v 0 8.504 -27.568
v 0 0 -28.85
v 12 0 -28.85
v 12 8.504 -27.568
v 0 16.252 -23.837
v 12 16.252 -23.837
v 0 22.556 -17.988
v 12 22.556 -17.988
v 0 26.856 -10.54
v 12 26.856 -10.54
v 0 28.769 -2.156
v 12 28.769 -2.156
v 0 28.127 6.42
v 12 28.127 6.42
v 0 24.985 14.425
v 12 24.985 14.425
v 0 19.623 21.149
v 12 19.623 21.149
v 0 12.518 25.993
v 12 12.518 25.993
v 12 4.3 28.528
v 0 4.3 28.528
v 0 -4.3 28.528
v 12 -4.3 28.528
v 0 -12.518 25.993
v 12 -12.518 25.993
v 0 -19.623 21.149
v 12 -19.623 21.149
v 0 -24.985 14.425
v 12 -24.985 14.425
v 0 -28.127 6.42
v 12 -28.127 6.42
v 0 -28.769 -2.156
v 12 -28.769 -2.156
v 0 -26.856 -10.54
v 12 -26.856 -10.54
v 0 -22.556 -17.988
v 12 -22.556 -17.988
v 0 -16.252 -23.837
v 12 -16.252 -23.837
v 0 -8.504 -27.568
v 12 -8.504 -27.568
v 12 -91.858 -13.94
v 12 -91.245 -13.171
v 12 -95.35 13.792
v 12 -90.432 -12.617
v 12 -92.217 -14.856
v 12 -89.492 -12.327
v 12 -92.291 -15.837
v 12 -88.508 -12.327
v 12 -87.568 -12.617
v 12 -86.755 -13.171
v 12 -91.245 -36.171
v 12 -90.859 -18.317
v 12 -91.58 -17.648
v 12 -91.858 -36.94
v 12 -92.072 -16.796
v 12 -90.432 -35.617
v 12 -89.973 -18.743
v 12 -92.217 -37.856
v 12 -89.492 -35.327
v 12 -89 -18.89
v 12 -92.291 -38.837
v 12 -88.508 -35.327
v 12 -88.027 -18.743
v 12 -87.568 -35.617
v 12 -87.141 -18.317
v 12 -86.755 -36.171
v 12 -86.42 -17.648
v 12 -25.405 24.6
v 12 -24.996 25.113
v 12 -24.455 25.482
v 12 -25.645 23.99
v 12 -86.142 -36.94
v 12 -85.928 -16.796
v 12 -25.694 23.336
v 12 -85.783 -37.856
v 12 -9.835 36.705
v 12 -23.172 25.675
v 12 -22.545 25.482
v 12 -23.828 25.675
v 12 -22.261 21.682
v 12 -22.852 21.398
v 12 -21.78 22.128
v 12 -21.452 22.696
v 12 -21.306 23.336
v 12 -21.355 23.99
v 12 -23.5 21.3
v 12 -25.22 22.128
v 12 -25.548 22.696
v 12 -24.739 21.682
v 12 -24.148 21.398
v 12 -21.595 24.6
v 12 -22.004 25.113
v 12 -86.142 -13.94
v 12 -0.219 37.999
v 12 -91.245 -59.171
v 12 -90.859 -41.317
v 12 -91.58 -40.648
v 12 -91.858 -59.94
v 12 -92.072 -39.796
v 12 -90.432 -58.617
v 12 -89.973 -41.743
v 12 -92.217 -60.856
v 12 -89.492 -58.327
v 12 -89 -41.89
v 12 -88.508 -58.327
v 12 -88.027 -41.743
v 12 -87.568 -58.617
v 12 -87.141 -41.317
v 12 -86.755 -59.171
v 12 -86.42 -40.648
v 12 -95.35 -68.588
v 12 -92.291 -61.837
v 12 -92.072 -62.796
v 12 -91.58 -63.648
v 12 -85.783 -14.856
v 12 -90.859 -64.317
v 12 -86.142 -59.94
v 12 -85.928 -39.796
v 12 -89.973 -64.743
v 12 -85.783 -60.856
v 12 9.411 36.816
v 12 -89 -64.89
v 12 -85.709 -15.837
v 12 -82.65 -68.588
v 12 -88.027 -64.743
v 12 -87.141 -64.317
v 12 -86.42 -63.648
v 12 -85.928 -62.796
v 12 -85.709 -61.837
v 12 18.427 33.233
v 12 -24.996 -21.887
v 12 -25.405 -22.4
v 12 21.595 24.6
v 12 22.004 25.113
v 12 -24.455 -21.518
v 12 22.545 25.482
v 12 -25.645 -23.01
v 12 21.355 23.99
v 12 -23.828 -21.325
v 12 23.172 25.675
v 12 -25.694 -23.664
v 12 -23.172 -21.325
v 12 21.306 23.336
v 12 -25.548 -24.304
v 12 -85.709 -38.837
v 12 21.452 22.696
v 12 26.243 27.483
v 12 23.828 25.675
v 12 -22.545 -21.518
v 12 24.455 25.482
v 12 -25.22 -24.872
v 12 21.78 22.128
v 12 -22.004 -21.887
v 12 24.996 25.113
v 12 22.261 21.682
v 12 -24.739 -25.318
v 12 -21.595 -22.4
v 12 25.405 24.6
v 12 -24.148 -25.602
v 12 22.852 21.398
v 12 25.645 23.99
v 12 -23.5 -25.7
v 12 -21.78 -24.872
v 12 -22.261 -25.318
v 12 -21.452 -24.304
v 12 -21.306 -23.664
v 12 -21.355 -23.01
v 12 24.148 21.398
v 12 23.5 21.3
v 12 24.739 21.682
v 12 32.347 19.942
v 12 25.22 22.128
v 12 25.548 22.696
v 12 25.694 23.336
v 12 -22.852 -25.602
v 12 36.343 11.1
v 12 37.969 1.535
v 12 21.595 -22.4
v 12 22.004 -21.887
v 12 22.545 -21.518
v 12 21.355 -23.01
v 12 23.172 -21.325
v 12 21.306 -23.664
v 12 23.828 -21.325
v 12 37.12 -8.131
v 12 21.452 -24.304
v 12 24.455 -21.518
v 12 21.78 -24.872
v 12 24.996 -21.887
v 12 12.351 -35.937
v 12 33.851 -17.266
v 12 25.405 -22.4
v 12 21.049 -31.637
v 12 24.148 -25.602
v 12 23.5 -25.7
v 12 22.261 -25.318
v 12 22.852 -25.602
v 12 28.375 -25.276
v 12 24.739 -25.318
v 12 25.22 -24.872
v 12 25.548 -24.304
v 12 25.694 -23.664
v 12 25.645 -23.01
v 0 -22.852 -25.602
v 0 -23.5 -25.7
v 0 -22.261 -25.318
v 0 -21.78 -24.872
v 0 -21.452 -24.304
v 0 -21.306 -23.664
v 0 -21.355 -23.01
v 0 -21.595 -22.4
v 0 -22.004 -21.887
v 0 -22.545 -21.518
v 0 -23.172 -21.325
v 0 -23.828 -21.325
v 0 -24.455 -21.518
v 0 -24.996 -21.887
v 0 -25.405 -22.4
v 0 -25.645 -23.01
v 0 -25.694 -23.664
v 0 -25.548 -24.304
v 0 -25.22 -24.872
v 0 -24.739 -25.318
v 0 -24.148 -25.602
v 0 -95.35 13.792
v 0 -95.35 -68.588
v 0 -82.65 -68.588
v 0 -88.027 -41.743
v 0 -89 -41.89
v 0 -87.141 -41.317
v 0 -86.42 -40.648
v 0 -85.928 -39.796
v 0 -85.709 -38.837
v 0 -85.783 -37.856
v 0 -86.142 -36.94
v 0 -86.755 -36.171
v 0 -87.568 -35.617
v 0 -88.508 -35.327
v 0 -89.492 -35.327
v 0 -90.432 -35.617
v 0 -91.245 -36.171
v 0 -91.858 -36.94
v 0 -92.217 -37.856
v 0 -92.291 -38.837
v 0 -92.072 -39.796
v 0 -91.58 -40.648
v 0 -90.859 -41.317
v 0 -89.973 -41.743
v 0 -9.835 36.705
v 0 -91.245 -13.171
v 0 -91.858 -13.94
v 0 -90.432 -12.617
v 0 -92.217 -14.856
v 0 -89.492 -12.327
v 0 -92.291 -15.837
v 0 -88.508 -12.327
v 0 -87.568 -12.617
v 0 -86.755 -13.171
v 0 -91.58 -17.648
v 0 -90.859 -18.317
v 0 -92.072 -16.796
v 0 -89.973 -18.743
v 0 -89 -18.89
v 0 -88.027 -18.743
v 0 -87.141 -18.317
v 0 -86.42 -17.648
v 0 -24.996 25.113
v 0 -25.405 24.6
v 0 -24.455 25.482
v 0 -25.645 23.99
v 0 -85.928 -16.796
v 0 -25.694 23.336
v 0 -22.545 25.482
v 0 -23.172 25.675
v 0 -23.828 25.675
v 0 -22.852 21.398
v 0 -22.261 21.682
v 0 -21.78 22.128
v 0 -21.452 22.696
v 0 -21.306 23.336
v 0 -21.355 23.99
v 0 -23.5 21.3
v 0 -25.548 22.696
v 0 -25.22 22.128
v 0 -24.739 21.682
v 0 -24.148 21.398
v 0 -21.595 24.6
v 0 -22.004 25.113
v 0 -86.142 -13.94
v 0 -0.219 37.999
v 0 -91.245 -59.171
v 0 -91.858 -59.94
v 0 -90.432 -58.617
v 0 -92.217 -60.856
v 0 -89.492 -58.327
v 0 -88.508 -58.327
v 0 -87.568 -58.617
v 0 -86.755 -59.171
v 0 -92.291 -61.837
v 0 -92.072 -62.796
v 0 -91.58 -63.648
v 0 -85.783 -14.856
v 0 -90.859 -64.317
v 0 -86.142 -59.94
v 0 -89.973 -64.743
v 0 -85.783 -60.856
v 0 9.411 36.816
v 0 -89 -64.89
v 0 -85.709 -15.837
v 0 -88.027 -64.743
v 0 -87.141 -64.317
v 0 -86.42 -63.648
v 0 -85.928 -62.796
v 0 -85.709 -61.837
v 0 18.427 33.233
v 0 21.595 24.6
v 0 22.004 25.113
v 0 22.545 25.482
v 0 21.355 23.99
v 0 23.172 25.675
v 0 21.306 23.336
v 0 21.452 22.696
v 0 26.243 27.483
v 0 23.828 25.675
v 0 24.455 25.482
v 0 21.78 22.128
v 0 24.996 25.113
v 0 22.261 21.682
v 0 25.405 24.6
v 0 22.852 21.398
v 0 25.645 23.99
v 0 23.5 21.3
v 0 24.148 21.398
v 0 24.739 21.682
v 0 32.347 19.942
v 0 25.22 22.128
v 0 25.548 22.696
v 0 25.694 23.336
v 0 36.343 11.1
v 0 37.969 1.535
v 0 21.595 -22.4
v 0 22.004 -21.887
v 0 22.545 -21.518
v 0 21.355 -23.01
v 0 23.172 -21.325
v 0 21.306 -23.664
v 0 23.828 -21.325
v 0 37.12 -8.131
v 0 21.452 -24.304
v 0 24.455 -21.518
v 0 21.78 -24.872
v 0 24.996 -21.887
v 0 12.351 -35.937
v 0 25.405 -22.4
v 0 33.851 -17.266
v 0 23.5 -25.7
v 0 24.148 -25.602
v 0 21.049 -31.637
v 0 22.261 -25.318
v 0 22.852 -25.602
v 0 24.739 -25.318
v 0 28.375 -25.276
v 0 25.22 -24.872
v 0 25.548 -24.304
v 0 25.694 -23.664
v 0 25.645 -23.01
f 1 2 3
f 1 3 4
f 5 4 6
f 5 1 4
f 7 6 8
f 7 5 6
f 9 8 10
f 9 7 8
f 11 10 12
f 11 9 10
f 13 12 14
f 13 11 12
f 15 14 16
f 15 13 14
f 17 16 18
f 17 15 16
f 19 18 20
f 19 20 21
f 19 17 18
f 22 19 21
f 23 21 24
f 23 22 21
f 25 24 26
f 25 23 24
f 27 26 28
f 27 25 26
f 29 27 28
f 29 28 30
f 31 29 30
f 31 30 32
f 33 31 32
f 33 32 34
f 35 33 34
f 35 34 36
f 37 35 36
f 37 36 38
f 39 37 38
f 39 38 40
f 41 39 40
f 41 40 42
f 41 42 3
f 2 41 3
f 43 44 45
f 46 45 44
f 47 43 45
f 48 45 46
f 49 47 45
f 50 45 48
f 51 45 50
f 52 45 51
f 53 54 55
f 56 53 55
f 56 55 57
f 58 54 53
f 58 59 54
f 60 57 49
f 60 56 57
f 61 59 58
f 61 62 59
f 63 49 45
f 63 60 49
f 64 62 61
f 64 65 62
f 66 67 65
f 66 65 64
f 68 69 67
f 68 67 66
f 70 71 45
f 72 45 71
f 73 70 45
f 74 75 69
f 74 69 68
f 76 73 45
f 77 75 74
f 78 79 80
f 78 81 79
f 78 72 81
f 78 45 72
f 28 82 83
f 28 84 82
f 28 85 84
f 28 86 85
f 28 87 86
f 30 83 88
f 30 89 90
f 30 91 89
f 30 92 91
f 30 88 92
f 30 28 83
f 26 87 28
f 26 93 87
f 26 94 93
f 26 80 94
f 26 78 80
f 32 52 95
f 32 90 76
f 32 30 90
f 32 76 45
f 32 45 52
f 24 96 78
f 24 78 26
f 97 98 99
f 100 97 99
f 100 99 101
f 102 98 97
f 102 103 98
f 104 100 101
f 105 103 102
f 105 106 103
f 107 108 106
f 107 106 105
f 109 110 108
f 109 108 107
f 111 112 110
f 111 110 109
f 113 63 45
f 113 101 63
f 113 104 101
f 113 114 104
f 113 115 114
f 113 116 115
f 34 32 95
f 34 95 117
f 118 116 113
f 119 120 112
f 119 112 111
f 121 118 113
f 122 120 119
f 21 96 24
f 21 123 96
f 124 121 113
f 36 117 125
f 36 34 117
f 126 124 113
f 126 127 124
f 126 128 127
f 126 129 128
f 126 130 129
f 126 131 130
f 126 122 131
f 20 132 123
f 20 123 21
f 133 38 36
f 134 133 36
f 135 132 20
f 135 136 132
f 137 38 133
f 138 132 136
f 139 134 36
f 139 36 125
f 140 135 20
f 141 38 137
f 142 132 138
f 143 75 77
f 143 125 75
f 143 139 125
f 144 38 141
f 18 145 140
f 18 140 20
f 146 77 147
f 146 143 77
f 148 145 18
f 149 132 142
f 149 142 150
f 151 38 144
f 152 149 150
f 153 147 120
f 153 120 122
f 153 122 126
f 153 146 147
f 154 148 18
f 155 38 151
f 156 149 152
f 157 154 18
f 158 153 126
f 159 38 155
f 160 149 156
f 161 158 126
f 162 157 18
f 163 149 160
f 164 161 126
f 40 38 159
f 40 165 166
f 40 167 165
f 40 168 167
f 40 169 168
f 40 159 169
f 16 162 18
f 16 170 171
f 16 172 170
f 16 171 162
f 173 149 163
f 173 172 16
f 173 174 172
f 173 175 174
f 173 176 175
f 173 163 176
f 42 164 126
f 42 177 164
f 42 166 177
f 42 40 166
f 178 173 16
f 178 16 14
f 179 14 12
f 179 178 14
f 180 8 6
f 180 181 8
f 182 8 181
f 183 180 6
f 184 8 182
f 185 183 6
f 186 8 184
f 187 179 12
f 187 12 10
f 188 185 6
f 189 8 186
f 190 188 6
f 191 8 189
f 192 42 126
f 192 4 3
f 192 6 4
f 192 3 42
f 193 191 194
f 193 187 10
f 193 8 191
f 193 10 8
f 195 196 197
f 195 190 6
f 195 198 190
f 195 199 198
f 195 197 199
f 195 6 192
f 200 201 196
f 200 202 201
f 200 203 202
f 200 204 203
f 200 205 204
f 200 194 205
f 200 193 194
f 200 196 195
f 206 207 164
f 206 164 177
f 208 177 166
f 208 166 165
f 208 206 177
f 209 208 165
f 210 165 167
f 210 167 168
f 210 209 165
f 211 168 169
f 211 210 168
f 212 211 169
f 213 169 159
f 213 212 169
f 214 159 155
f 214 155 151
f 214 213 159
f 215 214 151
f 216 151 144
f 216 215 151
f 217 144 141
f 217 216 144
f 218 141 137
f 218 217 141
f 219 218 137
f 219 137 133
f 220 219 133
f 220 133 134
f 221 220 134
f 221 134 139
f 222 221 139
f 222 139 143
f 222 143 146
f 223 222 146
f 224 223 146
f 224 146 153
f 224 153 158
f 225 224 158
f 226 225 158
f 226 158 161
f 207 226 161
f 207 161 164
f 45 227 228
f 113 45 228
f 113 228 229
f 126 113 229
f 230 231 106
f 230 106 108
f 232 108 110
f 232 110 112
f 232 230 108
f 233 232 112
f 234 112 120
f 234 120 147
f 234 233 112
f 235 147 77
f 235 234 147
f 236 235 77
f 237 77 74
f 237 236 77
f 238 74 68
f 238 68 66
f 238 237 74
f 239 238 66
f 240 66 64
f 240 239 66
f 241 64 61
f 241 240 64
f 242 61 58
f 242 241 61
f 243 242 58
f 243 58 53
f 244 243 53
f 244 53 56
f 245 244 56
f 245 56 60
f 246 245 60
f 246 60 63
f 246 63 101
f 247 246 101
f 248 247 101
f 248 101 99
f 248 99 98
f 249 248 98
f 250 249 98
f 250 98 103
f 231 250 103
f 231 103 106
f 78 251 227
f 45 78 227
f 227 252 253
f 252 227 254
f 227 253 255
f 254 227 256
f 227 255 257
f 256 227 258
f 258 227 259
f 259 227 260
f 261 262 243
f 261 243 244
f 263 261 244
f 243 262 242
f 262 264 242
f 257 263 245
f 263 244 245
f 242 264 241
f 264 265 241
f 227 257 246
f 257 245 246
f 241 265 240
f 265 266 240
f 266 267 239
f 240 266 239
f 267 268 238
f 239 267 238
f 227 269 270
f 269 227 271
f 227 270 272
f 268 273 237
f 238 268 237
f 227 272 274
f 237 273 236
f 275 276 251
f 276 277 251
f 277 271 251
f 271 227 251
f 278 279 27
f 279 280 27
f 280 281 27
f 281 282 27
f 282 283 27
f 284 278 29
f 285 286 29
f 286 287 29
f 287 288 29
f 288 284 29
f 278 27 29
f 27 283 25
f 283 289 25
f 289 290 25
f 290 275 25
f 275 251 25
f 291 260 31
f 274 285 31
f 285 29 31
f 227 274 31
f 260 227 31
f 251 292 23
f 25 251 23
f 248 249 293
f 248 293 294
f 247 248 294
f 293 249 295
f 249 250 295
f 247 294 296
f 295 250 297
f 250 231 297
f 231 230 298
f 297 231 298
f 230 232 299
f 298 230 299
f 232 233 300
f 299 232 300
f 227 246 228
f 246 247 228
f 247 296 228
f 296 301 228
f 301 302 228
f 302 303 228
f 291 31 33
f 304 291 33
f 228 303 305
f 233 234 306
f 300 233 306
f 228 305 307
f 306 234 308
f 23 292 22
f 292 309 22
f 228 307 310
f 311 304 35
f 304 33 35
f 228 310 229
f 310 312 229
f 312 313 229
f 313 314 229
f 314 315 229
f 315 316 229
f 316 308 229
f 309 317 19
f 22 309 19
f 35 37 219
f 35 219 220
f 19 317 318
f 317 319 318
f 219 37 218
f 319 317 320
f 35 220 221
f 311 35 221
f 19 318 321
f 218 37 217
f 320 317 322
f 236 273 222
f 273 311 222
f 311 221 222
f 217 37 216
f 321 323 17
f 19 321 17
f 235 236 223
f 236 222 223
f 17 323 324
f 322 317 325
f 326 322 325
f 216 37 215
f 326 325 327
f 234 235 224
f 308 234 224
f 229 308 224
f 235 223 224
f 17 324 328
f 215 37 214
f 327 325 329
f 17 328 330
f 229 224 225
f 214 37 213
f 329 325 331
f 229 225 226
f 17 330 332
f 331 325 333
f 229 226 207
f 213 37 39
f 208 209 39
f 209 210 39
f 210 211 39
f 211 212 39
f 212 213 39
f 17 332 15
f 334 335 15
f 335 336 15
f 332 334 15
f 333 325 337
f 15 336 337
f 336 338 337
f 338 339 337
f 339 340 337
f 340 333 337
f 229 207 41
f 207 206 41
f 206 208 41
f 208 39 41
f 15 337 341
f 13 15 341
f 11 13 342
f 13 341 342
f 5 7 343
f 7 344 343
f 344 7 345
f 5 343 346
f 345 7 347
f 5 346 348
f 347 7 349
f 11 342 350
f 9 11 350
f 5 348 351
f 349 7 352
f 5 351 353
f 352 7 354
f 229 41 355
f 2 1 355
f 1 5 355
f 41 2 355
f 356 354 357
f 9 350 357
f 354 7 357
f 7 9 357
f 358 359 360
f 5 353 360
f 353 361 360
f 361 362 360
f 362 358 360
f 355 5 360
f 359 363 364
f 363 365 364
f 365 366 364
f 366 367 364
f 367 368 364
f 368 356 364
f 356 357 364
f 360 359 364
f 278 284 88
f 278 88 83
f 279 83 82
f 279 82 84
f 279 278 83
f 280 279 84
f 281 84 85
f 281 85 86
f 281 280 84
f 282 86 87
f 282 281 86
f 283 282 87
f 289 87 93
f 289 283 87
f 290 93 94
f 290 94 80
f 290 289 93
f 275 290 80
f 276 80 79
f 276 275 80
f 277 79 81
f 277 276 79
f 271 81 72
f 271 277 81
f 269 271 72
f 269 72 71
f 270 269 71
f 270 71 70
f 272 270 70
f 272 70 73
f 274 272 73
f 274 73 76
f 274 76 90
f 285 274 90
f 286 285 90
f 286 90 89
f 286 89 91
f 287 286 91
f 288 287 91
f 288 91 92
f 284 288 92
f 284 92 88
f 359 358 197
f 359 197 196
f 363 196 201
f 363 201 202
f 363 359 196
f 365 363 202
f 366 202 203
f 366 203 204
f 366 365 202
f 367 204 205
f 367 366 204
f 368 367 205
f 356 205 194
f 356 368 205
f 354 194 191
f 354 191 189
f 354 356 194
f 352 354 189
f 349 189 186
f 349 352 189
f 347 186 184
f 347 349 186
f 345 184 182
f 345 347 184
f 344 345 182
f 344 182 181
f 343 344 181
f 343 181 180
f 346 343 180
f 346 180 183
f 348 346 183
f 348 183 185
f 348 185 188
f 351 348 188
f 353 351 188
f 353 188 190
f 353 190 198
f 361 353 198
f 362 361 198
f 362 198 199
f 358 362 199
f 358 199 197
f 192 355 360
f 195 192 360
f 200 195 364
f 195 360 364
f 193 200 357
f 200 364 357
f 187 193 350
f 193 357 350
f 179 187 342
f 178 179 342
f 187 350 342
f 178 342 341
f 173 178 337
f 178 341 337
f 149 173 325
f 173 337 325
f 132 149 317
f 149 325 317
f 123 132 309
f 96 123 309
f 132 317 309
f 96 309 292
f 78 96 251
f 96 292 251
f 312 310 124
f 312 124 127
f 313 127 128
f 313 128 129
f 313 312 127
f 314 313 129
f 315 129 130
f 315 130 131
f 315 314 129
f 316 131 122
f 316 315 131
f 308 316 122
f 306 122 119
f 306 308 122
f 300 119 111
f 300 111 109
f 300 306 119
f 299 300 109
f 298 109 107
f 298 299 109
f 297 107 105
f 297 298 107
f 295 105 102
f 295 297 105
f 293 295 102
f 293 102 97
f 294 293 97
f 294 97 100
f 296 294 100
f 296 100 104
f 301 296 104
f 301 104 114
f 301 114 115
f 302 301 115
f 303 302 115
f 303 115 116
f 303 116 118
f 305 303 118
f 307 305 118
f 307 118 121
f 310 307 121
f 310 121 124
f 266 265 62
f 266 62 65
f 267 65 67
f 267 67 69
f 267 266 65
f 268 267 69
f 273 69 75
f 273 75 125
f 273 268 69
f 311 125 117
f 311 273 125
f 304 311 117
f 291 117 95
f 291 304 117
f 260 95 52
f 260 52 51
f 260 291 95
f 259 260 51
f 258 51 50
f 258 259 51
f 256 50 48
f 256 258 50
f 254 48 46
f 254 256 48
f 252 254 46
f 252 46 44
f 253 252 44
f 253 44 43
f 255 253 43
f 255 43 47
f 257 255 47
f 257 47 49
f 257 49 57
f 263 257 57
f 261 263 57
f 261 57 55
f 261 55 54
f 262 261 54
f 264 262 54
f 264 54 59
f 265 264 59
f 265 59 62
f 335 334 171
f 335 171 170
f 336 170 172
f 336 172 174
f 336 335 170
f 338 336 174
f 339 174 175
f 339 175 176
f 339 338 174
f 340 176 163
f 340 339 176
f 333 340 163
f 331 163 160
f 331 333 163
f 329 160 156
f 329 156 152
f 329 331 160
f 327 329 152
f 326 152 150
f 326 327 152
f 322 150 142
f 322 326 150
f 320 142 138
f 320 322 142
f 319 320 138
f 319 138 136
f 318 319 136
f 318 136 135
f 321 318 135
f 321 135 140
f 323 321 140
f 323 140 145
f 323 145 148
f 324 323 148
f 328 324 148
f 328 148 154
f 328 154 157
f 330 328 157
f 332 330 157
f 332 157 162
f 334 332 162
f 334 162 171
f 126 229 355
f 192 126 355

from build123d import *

# Parameters (mm, degrees)
SKETCH1_R           = 38
SKETCH1_R_2         = 2.2
SKETCH1_R_3         = 28.85
SKETCH1_R_4         = 3.3
BOSS_EXTRUDE1_DEPTH = 12.7
MOVE_FACE4_BY       = 0.7


with BuildPart() as part:
    # Sketch1 → Boss-Extrude1 (new body)
    # profile 1 of 2: a face of its own
    with BuildSketch(Plane(origin=(0, 0, 0), x_dir=(0, 0, -1), z_dir=(1, 0, 0))):
        Circle(SKETCH1_R)
        with Locations((23.5, -23.5)):
            Circle(SKETCH1_R_2, mode=Mode.SUBTRACT)
        with Locations((-23.5, -23.5)):
            Circle(SKETCH1_R_2, mode=Mode.SUBTRACT)
        with Locations((23.5, 23.5)):
            Circle(SKETCH1_R_2, mode=Mode.SUBTRACT)
        with Locations((-23.5, 23.5)):
            Circle(SKETCH1_R_2, mode=Mode.SUBTRACT)
        Circle(SKETCH1_R_3, mode=Mode.SUBTRACT)
    # profile 2 of 2: a face of its own
    with BuildSketch(Plane(origin=(0, 0, 0), x_dir=(0, 0, -1), z_dir=(1, 0, 0))):
        with BuildLine():
            ThreePointArc((38, 0), (4.959995304, -37.674904732), (-36.705181399, -9.835123714))
            Line((-36.705181399, -9.835123714), (-13.791539357, -95.35))
            Line((-13.791539357, -95.35), (68.588460643, -95.35))
            Line((68.588460643, -95.35), (68.588460643, -82.65))
            Line((68.588460643, -82.65), (35.936663125, 12.351366055))
            ThreePointArc((35.936663125, 12.351366055), (37.480616315, 6.261261903), (38, 0))
        make_face()
        with Locations((15.59, -89)):
            Circle(SKETCH1_R_4, mode=Mode.SUBTRACT)
        with Locations((38.59, -89)):
            Circle(SKETCH1_R_4, mode=Mode.SUBTRACT)
        with Locations((61.59, -89)):
            Circle(SKETCH1_R_4, mode=Mode.SUBTRACT)
    extrude(amount=BOSS_EXTRUDE1_DEPTH)

    # Move Face4: a face moved inward by 0.7
    extrude(part.faces().sort_by_distance((12.7, -45.322375042, -15.580878329))[0], amount=MOVE_FACE4_BY, dir=(-1, 0, 0), mode=Mode.SUBTRACT)


solid = part.part
